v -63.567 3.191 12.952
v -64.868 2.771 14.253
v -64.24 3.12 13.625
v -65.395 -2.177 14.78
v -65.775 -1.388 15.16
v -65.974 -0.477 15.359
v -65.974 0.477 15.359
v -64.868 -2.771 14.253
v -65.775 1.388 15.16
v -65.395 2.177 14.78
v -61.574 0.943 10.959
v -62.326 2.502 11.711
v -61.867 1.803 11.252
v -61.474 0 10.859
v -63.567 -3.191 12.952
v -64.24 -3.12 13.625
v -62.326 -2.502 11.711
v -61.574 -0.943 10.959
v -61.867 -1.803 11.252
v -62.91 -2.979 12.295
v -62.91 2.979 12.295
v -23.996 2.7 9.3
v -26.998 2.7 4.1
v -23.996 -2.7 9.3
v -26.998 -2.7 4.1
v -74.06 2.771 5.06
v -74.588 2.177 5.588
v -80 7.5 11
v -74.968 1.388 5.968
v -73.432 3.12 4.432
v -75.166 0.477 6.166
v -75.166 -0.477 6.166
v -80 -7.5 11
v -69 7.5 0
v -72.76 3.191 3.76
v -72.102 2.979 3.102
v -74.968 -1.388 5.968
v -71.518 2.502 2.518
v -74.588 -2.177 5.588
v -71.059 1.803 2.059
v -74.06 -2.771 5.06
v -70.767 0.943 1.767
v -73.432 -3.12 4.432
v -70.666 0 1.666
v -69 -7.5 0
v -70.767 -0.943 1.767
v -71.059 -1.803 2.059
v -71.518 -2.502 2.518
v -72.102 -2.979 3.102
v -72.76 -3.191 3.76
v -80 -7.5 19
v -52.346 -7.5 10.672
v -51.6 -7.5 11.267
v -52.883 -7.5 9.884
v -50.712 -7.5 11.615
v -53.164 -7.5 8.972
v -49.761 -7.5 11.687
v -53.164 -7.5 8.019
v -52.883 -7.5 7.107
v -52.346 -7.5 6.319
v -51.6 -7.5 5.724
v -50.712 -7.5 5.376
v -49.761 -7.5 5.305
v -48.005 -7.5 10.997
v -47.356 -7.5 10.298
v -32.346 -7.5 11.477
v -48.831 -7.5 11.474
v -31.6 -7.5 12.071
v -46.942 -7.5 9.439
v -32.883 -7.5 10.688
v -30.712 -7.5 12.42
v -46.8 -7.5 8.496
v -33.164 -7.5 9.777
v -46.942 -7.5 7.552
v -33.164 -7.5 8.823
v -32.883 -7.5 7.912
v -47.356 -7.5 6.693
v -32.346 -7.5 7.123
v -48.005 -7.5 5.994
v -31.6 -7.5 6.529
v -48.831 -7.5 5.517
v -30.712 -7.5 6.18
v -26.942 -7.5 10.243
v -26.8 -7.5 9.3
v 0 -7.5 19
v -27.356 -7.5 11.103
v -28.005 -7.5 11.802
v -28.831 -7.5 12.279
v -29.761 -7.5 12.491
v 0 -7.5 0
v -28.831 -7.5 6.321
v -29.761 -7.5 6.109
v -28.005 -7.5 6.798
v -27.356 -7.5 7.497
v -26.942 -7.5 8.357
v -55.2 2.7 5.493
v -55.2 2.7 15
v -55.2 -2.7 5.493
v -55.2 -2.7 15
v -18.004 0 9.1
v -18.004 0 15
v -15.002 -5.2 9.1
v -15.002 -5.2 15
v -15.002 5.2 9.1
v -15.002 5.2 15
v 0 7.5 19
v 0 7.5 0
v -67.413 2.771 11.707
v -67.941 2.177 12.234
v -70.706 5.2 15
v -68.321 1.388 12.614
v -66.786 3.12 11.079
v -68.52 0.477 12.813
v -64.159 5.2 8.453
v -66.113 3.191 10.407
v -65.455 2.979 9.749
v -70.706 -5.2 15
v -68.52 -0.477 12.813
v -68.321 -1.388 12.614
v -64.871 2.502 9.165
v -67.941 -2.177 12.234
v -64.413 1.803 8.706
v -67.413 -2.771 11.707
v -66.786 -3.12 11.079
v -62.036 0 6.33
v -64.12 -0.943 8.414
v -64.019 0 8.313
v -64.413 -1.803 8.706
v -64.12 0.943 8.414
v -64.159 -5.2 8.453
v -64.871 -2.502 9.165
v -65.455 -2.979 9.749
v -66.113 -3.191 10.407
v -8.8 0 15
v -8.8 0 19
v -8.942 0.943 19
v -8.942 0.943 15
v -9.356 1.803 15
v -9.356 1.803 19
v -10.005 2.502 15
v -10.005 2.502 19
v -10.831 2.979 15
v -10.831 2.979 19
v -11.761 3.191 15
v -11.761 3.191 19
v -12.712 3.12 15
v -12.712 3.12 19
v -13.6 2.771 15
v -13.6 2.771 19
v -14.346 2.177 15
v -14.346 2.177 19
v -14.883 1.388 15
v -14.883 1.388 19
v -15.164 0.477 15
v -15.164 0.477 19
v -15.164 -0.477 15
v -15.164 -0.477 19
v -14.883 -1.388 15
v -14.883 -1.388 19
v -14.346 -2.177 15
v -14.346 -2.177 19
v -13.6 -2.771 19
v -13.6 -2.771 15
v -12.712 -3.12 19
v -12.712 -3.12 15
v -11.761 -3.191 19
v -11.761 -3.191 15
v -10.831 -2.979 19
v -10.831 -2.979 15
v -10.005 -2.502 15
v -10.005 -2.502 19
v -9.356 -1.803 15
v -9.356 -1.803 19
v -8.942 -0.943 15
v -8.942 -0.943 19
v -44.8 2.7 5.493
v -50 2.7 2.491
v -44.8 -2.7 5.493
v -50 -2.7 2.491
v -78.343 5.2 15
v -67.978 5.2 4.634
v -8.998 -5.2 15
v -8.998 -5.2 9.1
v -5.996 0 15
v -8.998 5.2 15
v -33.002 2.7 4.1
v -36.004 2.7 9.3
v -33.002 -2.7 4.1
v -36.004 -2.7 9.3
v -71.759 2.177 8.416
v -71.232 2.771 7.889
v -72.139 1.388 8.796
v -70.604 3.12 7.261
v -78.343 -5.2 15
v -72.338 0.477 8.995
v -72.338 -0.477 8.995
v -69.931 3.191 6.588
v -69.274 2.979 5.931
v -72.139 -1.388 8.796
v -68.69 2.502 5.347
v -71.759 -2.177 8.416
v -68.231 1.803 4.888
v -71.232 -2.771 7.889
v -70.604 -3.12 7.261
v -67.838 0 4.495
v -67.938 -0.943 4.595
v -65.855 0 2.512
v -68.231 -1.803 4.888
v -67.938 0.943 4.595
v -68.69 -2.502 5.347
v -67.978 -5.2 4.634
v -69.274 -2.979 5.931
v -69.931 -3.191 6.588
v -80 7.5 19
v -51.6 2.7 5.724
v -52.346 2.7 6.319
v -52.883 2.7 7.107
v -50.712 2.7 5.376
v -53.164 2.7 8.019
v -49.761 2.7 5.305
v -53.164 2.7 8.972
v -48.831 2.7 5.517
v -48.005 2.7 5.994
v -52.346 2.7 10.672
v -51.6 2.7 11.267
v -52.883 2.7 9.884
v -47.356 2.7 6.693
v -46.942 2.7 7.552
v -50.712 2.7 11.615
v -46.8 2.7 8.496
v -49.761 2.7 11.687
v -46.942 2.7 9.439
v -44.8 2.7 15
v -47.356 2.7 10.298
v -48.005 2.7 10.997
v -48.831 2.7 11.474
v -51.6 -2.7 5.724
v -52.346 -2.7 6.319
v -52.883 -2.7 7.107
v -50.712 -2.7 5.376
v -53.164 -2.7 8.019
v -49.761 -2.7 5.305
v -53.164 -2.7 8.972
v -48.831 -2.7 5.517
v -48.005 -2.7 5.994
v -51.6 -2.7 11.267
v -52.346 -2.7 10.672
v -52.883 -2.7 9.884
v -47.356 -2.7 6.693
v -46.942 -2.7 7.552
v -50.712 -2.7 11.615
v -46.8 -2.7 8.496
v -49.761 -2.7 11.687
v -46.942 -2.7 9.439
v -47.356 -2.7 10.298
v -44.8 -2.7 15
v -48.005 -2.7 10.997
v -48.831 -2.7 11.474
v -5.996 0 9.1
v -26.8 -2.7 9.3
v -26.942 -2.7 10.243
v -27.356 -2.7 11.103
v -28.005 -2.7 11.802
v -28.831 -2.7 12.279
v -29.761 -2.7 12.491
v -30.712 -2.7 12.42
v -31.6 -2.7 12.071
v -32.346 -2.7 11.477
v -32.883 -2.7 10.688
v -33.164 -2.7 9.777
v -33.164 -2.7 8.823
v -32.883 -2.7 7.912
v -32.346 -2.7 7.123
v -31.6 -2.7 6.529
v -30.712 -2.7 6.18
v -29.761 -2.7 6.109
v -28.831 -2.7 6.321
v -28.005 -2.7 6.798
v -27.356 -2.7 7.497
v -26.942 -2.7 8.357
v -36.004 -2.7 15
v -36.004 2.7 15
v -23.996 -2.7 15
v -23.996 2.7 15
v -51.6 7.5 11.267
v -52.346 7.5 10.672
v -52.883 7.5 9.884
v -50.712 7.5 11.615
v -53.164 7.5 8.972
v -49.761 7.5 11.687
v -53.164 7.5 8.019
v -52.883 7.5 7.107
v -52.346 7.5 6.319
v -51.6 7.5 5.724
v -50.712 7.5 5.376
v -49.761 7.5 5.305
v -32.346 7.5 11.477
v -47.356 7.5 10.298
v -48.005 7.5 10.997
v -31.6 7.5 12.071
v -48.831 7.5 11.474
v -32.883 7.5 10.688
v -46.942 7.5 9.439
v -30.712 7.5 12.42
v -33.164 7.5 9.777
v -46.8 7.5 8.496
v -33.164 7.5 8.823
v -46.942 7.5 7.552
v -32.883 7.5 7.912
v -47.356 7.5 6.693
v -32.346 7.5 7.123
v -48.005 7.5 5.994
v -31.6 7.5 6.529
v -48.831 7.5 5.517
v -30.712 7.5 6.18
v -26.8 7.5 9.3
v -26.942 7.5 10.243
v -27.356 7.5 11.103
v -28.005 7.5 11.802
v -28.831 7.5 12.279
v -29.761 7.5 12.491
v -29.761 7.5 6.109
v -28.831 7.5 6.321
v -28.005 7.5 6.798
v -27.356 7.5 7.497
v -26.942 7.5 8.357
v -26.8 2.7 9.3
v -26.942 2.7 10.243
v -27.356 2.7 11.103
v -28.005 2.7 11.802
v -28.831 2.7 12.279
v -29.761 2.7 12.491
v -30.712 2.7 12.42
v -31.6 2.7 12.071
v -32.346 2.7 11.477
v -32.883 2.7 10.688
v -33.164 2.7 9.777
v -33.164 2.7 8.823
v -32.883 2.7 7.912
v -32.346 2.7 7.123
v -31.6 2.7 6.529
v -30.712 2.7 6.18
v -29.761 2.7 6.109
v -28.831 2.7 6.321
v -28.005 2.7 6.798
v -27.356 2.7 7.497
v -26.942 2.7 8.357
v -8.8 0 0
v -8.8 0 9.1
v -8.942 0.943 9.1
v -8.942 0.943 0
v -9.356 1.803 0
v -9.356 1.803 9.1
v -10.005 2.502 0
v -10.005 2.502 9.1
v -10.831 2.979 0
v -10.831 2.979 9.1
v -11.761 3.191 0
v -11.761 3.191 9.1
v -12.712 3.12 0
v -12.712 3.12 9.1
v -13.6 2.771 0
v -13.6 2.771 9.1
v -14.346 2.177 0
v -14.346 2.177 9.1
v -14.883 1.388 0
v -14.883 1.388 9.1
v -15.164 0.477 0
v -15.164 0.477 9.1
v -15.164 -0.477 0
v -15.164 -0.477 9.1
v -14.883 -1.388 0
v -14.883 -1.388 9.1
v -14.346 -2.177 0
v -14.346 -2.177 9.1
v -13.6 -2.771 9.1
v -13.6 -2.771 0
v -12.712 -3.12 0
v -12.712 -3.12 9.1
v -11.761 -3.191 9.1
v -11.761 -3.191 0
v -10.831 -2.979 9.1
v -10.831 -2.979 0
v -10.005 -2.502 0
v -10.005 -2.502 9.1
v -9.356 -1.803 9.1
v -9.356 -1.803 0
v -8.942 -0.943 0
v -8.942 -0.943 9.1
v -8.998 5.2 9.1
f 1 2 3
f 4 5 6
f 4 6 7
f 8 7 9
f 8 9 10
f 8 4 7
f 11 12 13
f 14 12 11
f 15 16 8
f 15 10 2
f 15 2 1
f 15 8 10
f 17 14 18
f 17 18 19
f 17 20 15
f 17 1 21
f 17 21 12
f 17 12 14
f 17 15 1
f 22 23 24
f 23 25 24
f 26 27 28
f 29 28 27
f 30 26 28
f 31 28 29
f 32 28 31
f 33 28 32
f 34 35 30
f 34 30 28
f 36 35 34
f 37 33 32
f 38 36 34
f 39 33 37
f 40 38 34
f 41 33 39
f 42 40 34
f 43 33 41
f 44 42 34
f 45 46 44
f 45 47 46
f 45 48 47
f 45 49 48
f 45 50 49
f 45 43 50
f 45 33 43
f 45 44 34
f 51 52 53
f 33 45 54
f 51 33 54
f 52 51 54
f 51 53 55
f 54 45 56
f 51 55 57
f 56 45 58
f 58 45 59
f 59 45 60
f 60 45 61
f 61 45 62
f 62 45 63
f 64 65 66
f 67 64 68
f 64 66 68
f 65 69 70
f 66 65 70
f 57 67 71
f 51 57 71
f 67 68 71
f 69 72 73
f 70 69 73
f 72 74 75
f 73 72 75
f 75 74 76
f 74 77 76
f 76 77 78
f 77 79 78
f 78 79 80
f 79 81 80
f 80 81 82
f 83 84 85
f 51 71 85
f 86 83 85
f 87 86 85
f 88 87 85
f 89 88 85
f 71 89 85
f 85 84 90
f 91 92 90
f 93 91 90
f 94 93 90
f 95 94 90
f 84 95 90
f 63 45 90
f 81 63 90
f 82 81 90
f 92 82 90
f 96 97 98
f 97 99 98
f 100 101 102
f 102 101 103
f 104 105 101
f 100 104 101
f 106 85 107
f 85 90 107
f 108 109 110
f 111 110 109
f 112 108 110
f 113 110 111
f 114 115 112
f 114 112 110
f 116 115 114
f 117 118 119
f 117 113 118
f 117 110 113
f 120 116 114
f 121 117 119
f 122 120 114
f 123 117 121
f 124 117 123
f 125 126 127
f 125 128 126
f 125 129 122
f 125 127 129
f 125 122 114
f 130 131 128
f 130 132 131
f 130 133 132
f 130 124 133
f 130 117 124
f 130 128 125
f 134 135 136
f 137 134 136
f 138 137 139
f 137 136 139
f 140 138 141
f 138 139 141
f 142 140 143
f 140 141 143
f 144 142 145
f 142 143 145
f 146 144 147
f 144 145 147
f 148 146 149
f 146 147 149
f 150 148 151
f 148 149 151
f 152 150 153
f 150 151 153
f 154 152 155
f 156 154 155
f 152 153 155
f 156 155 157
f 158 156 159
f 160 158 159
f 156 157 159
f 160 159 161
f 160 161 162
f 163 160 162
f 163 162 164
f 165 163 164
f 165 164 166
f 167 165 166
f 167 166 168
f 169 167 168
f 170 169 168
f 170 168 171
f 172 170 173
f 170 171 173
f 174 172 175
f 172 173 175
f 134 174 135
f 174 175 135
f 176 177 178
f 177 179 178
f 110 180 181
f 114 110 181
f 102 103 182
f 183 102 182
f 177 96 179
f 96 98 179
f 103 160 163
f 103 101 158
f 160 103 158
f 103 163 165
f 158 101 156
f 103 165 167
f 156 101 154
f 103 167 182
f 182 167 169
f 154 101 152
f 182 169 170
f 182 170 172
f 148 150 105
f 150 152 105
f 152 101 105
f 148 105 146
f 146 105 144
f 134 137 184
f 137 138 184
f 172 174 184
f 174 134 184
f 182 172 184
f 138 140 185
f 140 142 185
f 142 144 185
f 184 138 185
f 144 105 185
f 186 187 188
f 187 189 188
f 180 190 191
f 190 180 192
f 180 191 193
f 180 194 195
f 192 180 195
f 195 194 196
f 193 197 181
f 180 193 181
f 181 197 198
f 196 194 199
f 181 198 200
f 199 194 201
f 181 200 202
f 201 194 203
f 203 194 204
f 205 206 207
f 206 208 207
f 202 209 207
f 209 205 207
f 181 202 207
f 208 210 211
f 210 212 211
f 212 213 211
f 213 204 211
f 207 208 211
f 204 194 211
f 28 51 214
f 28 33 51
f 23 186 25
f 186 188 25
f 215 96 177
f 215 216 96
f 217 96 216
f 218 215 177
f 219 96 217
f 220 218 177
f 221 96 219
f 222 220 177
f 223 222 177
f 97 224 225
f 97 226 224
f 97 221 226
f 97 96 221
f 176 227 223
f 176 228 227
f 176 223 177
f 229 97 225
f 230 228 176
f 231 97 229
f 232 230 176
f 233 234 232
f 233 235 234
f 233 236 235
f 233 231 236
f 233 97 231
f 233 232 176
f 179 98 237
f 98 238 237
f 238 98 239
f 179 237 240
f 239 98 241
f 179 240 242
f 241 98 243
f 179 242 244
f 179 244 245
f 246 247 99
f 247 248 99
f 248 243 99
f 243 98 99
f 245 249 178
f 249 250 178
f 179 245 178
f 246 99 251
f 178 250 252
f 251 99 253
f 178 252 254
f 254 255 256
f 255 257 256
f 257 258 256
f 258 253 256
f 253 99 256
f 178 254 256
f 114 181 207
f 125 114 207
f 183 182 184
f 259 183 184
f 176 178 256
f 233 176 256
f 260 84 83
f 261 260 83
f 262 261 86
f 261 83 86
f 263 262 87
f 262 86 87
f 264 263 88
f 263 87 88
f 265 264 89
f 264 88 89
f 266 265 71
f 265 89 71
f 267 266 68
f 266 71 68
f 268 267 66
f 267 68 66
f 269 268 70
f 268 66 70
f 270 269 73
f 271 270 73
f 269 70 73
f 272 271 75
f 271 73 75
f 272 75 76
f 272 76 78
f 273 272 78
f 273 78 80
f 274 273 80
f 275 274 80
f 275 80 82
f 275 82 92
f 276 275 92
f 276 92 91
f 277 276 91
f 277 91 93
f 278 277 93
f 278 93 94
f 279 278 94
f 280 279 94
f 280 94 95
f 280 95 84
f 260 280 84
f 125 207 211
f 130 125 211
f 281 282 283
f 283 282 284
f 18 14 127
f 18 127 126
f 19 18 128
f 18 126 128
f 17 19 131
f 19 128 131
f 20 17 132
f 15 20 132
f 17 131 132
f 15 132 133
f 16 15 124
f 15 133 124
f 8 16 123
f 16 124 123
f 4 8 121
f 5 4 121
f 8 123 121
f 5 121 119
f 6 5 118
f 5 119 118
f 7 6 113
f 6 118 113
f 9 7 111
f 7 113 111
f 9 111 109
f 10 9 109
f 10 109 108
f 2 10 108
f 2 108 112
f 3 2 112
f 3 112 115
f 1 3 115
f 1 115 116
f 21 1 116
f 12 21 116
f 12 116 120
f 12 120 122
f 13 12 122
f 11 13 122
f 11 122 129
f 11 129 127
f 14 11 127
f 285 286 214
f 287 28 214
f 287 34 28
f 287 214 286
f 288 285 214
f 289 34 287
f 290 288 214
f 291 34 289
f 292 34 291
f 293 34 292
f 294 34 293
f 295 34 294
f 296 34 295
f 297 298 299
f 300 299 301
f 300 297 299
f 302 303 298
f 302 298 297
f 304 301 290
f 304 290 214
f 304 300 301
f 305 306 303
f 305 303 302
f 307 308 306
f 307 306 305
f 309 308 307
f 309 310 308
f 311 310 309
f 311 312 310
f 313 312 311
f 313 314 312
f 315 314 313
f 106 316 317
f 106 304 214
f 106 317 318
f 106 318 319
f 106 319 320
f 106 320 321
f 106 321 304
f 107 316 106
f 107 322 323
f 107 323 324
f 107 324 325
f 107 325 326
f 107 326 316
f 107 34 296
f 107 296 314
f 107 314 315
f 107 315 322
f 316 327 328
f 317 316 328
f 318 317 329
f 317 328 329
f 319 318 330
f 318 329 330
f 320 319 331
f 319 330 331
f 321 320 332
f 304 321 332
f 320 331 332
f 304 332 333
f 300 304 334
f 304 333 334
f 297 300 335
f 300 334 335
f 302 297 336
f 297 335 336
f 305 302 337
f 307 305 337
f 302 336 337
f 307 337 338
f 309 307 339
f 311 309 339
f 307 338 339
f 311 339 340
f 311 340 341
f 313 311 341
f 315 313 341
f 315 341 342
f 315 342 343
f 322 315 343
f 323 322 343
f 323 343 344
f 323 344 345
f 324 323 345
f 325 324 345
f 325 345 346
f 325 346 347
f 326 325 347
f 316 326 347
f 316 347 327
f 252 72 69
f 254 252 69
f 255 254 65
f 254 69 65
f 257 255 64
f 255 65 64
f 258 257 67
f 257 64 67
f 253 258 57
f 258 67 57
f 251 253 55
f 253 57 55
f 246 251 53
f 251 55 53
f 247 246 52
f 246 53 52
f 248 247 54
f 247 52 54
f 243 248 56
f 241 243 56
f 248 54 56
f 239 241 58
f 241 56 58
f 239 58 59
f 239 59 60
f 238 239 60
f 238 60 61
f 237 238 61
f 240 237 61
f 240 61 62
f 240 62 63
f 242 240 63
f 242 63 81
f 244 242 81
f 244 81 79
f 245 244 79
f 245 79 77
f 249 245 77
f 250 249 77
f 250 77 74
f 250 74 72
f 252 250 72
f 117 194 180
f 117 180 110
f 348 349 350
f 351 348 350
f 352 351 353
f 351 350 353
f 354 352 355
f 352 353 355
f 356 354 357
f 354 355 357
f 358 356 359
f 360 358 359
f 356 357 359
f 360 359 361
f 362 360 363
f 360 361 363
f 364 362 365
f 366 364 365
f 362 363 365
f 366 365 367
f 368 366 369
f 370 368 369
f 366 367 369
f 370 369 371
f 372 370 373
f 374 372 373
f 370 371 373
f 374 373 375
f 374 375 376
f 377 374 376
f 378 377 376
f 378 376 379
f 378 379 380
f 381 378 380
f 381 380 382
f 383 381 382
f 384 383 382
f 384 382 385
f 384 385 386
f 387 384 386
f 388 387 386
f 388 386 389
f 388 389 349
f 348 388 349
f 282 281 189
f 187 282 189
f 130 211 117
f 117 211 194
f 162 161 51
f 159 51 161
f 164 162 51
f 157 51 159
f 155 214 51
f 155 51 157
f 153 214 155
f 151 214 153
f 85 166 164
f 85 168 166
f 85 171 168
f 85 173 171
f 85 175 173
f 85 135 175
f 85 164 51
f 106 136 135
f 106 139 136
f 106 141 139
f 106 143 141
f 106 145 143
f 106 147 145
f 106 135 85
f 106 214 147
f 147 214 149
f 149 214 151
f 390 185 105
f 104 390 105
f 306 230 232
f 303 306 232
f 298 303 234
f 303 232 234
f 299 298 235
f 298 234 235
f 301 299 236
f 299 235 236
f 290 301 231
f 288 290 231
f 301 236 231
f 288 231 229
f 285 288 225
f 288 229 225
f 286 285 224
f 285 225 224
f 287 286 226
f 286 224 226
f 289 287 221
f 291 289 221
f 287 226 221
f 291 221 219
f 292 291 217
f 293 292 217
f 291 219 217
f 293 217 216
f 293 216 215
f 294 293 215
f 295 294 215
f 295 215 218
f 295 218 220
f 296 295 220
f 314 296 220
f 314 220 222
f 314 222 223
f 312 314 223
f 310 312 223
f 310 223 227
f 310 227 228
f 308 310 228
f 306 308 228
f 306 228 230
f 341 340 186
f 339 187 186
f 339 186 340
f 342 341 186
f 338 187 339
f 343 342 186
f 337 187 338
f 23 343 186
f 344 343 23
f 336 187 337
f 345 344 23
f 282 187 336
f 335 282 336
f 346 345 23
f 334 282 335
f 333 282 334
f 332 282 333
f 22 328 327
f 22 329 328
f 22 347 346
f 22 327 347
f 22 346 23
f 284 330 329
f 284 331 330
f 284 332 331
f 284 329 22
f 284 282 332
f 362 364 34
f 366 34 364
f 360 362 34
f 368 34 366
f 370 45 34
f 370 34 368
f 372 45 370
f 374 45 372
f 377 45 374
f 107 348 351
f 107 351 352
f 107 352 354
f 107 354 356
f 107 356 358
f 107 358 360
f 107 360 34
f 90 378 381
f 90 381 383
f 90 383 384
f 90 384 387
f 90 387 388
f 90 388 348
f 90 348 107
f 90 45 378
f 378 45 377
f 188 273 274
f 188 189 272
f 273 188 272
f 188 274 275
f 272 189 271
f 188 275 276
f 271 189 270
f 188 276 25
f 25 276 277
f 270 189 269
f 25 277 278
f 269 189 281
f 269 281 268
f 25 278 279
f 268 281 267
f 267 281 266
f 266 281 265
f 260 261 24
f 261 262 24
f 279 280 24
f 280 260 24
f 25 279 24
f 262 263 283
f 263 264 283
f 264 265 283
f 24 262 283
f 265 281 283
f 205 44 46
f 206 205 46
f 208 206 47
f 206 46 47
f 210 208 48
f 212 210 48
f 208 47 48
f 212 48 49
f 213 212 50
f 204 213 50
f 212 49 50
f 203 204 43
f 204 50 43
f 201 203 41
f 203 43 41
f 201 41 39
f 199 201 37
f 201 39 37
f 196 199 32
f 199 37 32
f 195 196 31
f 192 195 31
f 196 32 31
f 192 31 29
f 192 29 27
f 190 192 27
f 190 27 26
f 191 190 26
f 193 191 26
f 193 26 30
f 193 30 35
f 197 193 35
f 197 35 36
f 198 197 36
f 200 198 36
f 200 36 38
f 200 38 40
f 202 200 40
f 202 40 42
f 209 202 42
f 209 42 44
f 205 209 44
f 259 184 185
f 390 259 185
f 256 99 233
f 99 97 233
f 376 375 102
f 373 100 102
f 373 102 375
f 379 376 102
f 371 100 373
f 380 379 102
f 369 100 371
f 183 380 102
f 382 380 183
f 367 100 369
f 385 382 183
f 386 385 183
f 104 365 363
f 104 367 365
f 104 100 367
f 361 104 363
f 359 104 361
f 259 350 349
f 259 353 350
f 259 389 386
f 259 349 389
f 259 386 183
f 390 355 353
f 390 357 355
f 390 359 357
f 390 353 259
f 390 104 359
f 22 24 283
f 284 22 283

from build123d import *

# Parameters (mm, degrees)
F1_DEPTH  = 7.5
F2_R      = 3.2
F3_DEPTH  = 15.001
F5_DEPTH  = 2.7
F7_DEPTH  = 5.9
F8_R      = 3.2
F9_DEPTH  = 15.001
F11_DEPTH = 2.7
F12_R     = 3.2
F13_DEPTH = 15.001
F16_DEPTH = 5.4
F17_W     = 80
F17_H     = 15
F18_DEPTH = 4
F19_R     = 3.2
F20_DEPTH = 13
F21_R     = 3.2
F22_DEPTH = 4


with BuildPart() as f1:
    # F0 (on Front) → F1 (new body, symmetric)
    with BuildSketch(Plane.XZ):
        Polygon((-69, 0), (0, 0), (0, 15), (-80, 15), (-80, 11), align=None)
    extrude(amount=F1_DEPTH, both=True)

    # F2 (on face) → F3 (cut, through all)
    with BuildSketch(Plane.XY.offset(15)):
        with Locations((-12, 0)):
            Circle(F2_R)
    extrude(amount=-F3_DEPTH, mode=Mode.SUBTRACT)

    # F4 (on Front) → F5 (cut, symmetric)
    with BuildSketch(Plane.XZ):
        Polygon((-26.9977786002, 4.1), (-23.9955572004, 9.3), (-23.9955572004, 15), (-36.0044427996, 15), (-36.0044427996, 9.3), (-33.0022213998, 4.1), align=None)
    extrude(amount=F5_DEPTH, both=True, mode=Mode.SUBTRACT)

    # F6 (on face) → F7 (cut)
    with BuildSketch(Plane.XY.offset(15)):
        Polygon((-15.0022213998, -5.2), (-8.9977786002, -5.2), (-5.9955572004, 0), (-8.9977786002, 5.2), (-15.0022213998, 5.2), (-18.0044427996, 0), align=None)
    extrude(amount=-F7_DEPTH, mode=Mode.SUBTRACT)

    # F8 (on face) → F9 (cut, through all)
    with BuildSketch(Plane.XZ.offset(7.5)):
        with Locations((-30, 9.3)):
            Circle(F8_R)
    extrude(amount=-F9_DEPTH, mode=Mode.SUBTRACT)

    # F10 (on Front) → F11 (cut, symmetric)
    with BuildSketch(Plane.XZ):
        Polygon((-50, 2.4911144009), (-44.8, 5.4933358006), (-44.8, 11.4977786002), (-44.8, 15), (-55.2, 15), (-55.2, 11.4977786002), (-55.2, 5.4933358006), align=None)
    extrude(amount=F11_DEPTH, both=True, mode=Mode.SUBTRACT)

    # F12 (on face) → F13 (cut, through all)
    with BuildSketch(Plane.XZ.offset(7.5)):
        with Locations((-50, 8.4955572004)):
            Circle(F12_R)
    extrude(amount=-F13_DEPTH, mode=Mode.SUBTRACT)

    # F15 (on offset) → F16 (cut)
    with BuildSketch(Plane(origin=(-31.6715728753, 0, -31.6715728753), x_dir=(0.7071067812, 0, -0.7071067812), z_dir=(-0.7071067812, 0, -0.7071067812))):
        Polygon((-48.3422742884, 0), (-51.3444956882, 5.2), (-57.3489384878, 5.2), (-66.0035713375, 5.2), (-66.0035713375, -5.2), (-57.3489384878, -5.2), (-51.3444956882, -5.2), align=None)
    extrude(amount=-F16_DEPTH, mode=Mode.SUBTRACT)

    # F17 (on face) → F18 (join)
    with BuildSketch(Plane.XY.offset(15)):
        with Locations((-40, 0)):
            Rectangle(F17_W, F17_H)
    extrude(amount=F18_DEPTH)

    # F19 (on face) → F20 (cut)
    with BuildSketch(Plane(origin=(-34.5, 0, -34.5), x_dir=(0.7071067812, 0, -0.7071067812), z_dir=(-0.7071067812, 0, -0.7071067812))):
        with Locations((-54.346717088, 0)):
            Circle(F19_R)
    extrude(amount=-F20_DEPTH, mode=Mode.SUBTRACT)

    # F21 (on face) → F22 (cut, through all)
    with BuildSketch(Plane.XY.offset(19)):
        with Locations((-12, 0)):
            Circle(F21_R)
    extrude(amount=-F22_DEPTH, mode=Mode.SUBTRACT)


solid = f1.part
